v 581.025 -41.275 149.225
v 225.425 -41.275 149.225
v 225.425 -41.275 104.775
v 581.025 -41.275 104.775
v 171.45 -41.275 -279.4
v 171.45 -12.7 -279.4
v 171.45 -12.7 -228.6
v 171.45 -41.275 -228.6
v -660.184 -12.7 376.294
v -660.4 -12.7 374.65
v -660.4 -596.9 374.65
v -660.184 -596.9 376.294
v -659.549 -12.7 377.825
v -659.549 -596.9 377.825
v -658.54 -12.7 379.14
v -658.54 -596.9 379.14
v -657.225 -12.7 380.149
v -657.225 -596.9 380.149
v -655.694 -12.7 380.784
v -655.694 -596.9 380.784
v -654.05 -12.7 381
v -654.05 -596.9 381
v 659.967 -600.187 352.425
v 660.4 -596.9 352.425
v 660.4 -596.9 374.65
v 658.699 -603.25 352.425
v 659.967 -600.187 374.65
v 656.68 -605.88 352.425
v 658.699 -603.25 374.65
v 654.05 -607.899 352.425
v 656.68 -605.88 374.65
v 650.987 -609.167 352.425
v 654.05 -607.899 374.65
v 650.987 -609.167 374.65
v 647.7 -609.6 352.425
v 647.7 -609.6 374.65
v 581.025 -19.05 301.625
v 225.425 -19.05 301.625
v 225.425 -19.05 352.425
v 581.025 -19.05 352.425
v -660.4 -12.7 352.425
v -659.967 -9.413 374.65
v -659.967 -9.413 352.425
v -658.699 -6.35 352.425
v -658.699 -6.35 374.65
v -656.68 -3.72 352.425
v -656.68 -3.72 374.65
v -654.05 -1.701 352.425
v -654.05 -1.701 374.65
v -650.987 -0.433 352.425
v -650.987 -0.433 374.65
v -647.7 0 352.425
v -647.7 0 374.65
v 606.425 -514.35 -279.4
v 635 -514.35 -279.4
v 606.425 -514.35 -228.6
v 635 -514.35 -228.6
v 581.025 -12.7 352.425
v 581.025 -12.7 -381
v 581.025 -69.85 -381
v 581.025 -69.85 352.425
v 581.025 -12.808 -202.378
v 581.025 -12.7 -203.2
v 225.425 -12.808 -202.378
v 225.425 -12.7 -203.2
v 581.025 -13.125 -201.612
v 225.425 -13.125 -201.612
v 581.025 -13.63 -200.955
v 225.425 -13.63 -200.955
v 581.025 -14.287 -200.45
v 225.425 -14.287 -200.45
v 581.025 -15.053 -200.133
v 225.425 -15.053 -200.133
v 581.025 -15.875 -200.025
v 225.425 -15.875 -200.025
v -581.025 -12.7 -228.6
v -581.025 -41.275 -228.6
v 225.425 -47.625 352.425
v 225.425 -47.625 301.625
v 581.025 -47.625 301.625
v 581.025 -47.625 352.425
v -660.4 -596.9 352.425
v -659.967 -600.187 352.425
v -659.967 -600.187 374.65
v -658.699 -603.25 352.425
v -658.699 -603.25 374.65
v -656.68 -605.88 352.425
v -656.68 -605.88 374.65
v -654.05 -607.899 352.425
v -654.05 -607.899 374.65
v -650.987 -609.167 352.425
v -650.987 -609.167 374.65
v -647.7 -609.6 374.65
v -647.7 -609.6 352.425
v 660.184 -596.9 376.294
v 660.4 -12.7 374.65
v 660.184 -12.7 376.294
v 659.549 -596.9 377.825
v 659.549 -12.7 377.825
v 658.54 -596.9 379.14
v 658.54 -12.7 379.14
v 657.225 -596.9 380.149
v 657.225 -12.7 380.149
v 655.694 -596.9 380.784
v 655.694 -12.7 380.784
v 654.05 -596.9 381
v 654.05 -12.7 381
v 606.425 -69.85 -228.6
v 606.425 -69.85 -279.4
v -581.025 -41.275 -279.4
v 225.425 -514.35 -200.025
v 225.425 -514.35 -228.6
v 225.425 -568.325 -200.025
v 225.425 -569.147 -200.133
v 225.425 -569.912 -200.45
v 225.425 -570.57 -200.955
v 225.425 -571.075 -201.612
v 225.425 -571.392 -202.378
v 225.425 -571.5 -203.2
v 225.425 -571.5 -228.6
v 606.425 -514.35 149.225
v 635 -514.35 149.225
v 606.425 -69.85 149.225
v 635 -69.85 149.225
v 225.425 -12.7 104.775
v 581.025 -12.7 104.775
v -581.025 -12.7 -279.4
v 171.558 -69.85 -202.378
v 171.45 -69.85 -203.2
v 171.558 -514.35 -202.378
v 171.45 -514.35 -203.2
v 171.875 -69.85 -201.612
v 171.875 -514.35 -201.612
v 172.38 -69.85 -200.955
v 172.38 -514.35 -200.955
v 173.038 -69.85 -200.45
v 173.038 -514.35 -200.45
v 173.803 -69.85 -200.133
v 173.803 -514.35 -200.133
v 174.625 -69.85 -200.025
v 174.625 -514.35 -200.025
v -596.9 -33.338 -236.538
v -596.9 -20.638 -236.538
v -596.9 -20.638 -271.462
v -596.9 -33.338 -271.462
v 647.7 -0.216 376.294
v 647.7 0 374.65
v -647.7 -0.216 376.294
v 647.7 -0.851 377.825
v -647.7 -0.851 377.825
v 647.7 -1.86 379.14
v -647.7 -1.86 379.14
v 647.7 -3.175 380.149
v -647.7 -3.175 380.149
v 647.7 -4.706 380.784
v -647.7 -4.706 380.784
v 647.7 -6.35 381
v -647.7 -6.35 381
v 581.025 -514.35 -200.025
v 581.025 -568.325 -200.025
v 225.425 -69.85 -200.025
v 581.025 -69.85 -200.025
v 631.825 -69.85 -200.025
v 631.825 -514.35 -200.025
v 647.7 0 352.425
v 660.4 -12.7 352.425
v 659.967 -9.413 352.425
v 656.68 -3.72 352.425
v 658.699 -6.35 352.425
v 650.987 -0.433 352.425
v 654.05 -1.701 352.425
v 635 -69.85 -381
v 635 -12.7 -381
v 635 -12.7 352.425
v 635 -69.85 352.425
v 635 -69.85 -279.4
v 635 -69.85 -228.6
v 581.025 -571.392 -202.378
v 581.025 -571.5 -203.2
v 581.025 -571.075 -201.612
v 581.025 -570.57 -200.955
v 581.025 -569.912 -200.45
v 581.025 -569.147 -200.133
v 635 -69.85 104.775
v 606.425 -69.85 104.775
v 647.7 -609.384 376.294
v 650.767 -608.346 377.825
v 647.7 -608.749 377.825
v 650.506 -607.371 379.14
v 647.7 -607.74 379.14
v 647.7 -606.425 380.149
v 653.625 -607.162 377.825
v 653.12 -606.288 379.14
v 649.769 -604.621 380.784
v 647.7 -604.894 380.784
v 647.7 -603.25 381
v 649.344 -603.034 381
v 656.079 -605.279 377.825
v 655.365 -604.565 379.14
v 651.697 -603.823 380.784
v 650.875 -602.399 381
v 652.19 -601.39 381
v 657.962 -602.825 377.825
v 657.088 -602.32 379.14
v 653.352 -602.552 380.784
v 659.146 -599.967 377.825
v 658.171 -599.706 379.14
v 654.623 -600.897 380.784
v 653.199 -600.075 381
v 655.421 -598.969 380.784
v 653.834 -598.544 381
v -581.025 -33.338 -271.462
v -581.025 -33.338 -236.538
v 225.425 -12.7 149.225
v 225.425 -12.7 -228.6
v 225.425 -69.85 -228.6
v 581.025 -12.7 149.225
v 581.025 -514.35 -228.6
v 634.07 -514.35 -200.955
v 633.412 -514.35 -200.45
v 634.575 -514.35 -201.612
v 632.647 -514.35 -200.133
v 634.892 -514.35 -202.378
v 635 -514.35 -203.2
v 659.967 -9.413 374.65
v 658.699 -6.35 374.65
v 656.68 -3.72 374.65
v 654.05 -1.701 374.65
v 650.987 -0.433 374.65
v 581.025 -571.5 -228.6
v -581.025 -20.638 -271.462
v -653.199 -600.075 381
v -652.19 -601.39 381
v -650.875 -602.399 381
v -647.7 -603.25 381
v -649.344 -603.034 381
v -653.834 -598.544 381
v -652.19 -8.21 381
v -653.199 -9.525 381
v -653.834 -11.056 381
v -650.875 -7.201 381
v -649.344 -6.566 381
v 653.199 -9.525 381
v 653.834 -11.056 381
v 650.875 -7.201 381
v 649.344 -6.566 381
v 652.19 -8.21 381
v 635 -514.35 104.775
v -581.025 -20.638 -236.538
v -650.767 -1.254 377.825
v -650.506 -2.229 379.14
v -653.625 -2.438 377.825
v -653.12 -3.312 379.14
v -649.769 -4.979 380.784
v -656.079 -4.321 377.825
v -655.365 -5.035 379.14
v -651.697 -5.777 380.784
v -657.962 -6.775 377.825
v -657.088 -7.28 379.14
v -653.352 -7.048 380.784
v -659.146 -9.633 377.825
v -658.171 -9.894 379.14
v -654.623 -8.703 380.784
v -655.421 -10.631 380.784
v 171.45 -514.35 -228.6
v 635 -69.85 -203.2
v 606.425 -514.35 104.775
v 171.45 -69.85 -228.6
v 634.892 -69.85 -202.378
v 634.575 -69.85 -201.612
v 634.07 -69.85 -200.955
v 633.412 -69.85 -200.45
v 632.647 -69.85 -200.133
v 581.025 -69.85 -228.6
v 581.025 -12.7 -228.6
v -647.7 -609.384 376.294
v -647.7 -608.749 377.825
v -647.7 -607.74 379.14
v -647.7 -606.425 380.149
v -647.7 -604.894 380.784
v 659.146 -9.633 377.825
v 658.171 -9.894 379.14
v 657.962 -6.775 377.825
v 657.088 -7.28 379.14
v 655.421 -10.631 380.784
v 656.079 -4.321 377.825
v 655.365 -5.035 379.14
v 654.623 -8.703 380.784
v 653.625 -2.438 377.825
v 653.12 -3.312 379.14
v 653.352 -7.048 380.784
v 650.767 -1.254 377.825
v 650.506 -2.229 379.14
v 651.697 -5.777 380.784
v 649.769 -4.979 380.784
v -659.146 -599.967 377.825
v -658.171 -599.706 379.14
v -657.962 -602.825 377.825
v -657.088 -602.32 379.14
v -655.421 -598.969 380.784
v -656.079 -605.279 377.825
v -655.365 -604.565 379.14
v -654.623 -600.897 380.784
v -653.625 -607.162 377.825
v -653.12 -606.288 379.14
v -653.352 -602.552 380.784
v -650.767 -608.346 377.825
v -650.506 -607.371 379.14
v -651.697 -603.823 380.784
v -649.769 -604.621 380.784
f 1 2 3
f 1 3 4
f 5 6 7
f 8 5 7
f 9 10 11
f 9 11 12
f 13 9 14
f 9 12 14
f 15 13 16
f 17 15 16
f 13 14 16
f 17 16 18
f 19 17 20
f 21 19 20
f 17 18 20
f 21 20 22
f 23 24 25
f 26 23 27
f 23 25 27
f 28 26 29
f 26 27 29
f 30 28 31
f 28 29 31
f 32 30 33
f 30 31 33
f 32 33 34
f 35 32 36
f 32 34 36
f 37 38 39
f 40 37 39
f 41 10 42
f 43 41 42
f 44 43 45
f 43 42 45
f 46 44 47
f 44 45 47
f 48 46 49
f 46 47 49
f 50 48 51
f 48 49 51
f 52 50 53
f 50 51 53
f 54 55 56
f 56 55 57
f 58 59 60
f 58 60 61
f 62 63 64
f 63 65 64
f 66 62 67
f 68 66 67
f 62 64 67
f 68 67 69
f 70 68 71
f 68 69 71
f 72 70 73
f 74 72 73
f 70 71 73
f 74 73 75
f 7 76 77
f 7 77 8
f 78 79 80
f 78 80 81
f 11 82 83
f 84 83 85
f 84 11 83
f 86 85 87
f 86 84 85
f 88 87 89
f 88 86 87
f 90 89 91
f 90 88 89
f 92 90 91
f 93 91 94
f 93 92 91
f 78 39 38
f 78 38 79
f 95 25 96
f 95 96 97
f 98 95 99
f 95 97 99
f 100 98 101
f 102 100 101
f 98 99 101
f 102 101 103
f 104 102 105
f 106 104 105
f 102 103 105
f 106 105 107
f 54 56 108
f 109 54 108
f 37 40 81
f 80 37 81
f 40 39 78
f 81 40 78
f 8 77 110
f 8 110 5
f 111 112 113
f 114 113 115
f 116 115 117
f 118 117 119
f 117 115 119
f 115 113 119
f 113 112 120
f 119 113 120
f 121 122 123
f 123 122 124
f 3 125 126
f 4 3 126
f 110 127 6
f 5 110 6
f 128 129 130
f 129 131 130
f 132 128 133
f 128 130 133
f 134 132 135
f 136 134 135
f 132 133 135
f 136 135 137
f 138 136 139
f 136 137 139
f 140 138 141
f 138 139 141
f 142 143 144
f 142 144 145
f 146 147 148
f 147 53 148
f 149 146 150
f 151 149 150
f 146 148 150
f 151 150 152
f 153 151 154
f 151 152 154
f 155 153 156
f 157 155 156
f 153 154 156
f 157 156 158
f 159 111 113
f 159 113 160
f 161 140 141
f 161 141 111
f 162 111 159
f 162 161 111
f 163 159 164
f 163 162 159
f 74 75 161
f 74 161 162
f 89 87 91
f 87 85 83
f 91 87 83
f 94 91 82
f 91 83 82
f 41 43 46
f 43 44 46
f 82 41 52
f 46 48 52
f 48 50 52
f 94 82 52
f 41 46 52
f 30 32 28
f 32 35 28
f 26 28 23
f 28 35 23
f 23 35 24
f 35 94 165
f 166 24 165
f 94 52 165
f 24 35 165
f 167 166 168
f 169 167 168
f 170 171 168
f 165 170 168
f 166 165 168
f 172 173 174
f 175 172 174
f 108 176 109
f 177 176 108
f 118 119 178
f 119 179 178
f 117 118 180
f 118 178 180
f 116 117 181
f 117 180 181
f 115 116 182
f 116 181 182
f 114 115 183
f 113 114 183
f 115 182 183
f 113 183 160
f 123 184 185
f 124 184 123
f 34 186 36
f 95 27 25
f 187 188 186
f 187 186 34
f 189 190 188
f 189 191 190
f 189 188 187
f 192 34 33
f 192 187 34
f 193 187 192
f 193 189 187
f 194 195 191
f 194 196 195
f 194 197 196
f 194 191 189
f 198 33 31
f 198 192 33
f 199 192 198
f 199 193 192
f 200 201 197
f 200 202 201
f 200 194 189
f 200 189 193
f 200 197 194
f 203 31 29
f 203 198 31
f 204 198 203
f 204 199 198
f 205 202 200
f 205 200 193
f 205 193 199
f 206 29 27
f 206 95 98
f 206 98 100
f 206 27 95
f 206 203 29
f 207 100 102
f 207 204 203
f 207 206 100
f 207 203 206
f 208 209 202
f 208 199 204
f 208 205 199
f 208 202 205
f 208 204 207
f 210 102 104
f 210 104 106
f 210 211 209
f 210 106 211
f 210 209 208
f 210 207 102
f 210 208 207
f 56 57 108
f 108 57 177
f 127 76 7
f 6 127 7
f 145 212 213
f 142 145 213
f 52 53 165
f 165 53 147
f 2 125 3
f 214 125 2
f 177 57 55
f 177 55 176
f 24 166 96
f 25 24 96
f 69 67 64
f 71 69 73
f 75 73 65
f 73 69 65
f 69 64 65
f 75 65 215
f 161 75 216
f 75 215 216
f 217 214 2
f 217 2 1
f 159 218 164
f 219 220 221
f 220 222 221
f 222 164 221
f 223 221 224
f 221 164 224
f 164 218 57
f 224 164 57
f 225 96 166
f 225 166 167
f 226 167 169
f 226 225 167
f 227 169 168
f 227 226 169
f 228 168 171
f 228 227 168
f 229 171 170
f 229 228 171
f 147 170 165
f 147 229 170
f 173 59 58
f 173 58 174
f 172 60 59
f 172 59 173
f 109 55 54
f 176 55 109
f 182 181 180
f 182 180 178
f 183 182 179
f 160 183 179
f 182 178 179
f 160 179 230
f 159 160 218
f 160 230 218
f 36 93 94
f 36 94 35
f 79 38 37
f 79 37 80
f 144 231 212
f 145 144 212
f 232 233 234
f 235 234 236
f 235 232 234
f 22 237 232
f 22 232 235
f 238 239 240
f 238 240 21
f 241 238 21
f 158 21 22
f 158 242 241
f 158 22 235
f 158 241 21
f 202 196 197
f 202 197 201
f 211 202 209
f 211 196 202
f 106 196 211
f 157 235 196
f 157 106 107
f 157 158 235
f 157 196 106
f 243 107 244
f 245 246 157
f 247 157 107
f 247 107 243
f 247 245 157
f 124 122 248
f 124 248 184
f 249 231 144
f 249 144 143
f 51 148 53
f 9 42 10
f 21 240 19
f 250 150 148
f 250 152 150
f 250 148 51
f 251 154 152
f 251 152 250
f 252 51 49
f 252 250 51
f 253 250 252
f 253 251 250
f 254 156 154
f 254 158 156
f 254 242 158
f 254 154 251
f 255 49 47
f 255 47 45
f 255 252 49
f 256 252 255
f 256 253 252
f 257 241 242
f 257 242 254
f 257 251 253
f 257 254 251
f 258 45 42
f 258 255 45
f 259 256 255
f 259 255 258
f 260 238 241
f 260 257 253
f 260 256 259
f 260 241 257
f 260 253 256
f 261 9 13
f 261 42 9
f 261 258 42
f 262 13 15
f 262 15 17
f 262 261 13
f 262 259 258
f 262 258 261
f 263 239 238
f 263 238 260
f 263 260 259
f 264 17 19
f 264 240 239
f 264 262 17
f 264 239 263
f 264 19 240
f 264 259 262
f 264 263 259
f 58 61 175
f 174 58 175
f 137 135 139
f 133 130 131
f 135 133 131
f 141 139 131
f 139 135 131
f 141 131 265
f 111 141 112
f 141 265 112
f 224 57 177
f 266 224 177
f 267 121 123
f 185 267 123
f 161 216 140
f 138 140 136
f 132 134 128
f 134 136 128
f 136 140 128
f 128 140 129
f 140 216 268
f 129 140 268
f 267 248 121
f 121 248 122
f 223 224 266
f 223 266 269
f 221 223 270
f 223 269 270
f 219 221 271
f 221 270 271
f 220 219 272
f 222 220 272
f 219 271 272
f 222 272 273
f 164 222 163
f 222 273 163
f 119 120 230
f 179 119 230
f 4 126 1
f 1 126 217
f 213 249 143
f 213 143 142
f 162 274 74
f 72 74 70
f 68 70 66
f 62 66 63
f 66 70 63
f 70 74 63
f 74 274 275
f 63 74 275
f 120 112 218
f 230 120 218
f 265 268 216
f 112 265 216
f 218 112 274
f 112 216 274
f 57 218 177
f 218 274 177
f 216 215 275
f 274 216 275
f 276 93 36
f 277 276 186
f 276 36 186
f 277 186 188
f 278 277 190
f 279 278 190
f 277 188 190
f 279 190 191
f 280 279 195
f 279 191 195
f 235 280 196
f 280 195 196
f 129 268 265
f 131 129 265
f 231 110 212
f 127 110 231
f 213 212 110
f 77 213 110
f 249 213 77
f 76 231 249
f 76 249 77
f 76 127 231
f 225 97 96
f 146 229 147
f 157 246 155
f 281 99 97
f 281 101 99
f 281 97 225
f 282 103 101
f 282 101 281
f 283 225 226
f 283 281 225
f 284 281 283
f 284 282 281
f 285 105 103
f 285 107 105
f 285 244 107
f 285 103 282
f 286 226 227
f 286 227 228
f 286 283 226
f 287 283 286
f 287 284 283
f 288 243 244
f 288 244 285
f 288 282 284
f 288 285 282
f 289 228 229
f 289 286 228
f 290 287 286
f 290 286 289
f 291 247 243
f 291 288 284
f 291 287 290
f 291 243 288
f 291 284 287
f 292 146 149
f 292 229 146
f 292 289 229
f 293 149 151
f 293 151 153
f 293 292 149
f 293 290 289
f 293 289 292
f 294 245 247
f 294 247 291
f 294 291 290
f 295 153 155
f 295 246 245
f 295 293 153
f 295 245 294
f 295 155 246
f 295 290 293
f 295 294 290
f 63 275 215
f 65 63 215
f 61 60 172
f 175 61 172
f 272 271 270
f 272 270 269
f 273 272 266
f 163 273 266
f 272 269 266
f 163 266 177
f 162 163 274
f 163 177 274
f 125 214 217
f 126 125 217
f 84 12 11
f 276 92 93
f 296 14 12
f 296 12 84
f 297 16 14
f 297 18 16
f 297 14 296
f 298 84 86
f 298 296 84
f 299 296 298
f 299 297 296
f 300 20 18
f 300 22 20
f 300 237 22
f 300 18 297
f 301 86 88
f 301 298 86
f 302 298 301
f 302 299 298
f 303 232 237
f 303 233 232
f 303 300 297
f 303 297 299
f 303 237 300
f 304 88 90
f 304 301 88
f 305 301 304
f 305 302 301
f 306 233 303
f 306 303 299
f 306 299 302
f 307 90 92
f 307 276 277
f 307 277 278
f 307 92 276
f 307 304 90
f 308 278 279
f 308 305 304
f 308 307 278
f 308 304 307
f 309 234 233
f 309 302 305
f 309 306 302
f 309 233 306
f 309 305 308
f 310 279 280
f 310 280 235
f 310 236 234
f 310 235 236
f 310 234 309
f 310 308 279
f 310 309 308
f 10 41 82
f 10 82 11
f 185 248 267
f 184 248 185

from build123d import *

# Parameters (mm, degrees)
F13_W     = 53.975
F13_H     = 733.425
F15_DEPTH = 57.15
F16_W     = 28.575
F16_H     = 50.8
F17_DEPTH = 355.6
F20_W     = 752.475
F20_H     = 50.8
F21_DEPTH = 28.575
F19_W     = 444.5
F19_H     = 50.8
F23_DEPTH = 28.575
F22_W     = 1320.8
F22_H     = 28.575
F24_DEPTH = 609.6
F25_R     = 12.7
F26_R     = 6.35
F27_W     = 28.575
F27_H     = 444.5
F28_DEPTH = 28.575
F29_R     = 3.175
F30_W     = 444.5
F30_H     = 44.45
F31_DEPTH = 28.575
F32_W     = 355.6
F32_H     = 44.45
F33_DEPTH = 28.575
F34_W     = 12.7
F34_H     = 34.925
F35_DEPTH = 15.875


with BuildPart() as f15:
    # F13 (on plane+point) → F15 (new body, through all)
    with BuildSketch(Plane.XZ.offset(12.7)):
        with Locations((608.0125, -14.2875)):
            Rectangle(F13_W, F13_H)
    extrude(amount=F15_DEPTH)


with BuildPart() as f17:
    # F16 (on face) → F17 (new body, through all)
    with BuildSketch(Plane(origin=(581.025, 0, 0), x_dir=(0, -1, 0), z_dir=(-1, 0, 0))):
        with Locations((33.3375, 327.025)):
            Rectangle(F16_W, F16_H)
    extrude(amount=F17_DEPTH)


with BuildPart() as f21:
    # F20 (on plane+point) → F21 (new body)
    with BuildSketch(Plane.XZ.offset(12.7)):
        with Locations((-204.7875, -254)):
            Rectangle(F20_W, F20_H)
    extrude(amount=F21_DEPTH)

    # F34 (on face) → F35 (join)
    with BuildSketch(Plane(origin=(-581.025, 0, 0), x_dir=(0, -1, 0), z_dir=(-1, 0, 0))):
        with Locations((26.9875, -254)):
            Rectangle(F34_W, F34_H)
    extrude(amount=F35_DEPTH)


with BuildPart() as f23:
    # F19 (on plane+point) → F23 (new body)
    with BuildSketch(Plane.YZ.offset(635)):
        with Locations((-292.1, -254)):
            Rectangle(F19_W, F19_H)
    extrude(amount=-F23_DEPTH)


with BuildPart() as f24:
    # F22 (on Front) → F24 (new body)
    with BuildSketch(Plane.XZ):
        with Locations((0, 366.7125)):
            Rectangle(F22_W, F22_H)
    extrude(amount=F24_DEPTH)

    # F25
    f25_edges = [f24.edges().sort_by_distance(p)[0] for p in [
        (660.4, -609.6, 366.7125),
        (660.4, 0, 366.7125),
        (-660.4, 0, 366.7125),
        (-660.4, -609.6, 366.7125),
    ]]
    fillet(f25_edges, radius=F25_R)

    # F26
    f26_edges = [f24.edges().sort_by_distance(p)[0] for p in [
        (-660.4, -304.8, 381),
    ]]
    fillet(f26_edges, radius=F26_R)


with BuildPart() as f28:
    # F27 (on face) → F28 (new body)
    with BuildSketch(Plane.XY.offset(-228.6)):
        Polygon((606.425, -69.85), (581.025, -69.85), (581.025, -12.7), (403.225, -12.7), (225.425, -12.7), (225.425, -69.85), (171.45, -69.85), (171.45, -514.35), (225.425, -514.35), (225.425, -571.5), (403.225, -571.5), (581.025, -571.5), (581.025, -514.35), (606.425, -514.35), align=None)
        with Locations((620.7125, -292.1)):
            Rectangle(F27_W, F27_H)
    extrude(amount=F28_DEPTH)

    # F29
    f29_edges = [f28.edges().sort_by_distance(p)[0] for p in [
        (403.225, -571.5, -200.025),
        (635, -292.1, -200.025),
        (403.225, -12.7, -200.025),
        (171.45, -292.1, -200.025),
    ]]
    fillet(f29_edges, radius=F29_R)


with BuildPart() as f31:
    # F30 (on plane+point) → F31 (new body)
    with BuildSketch(Plane.YZ.offset(635)):
        with Locations((-292.1, 127)):
            Rectangle(F30_W, F30_H)
    extrude(amount=-F31_DEPTH)


with BuildPart() as f33:
    # F32 (on plane+point) → F33 (new body)
    with BuildSketch(Plane.XZ.offset(12.7)):
        with Locations((403.225, 127)):
            Rectangle(F32_W, F32_H)
    extrude(amount=F33_DEPTH)


solid = Compound([f15.part, f17.part, f21.part, f23.part, f24.part, f28.part, f31.part, f33.part])
